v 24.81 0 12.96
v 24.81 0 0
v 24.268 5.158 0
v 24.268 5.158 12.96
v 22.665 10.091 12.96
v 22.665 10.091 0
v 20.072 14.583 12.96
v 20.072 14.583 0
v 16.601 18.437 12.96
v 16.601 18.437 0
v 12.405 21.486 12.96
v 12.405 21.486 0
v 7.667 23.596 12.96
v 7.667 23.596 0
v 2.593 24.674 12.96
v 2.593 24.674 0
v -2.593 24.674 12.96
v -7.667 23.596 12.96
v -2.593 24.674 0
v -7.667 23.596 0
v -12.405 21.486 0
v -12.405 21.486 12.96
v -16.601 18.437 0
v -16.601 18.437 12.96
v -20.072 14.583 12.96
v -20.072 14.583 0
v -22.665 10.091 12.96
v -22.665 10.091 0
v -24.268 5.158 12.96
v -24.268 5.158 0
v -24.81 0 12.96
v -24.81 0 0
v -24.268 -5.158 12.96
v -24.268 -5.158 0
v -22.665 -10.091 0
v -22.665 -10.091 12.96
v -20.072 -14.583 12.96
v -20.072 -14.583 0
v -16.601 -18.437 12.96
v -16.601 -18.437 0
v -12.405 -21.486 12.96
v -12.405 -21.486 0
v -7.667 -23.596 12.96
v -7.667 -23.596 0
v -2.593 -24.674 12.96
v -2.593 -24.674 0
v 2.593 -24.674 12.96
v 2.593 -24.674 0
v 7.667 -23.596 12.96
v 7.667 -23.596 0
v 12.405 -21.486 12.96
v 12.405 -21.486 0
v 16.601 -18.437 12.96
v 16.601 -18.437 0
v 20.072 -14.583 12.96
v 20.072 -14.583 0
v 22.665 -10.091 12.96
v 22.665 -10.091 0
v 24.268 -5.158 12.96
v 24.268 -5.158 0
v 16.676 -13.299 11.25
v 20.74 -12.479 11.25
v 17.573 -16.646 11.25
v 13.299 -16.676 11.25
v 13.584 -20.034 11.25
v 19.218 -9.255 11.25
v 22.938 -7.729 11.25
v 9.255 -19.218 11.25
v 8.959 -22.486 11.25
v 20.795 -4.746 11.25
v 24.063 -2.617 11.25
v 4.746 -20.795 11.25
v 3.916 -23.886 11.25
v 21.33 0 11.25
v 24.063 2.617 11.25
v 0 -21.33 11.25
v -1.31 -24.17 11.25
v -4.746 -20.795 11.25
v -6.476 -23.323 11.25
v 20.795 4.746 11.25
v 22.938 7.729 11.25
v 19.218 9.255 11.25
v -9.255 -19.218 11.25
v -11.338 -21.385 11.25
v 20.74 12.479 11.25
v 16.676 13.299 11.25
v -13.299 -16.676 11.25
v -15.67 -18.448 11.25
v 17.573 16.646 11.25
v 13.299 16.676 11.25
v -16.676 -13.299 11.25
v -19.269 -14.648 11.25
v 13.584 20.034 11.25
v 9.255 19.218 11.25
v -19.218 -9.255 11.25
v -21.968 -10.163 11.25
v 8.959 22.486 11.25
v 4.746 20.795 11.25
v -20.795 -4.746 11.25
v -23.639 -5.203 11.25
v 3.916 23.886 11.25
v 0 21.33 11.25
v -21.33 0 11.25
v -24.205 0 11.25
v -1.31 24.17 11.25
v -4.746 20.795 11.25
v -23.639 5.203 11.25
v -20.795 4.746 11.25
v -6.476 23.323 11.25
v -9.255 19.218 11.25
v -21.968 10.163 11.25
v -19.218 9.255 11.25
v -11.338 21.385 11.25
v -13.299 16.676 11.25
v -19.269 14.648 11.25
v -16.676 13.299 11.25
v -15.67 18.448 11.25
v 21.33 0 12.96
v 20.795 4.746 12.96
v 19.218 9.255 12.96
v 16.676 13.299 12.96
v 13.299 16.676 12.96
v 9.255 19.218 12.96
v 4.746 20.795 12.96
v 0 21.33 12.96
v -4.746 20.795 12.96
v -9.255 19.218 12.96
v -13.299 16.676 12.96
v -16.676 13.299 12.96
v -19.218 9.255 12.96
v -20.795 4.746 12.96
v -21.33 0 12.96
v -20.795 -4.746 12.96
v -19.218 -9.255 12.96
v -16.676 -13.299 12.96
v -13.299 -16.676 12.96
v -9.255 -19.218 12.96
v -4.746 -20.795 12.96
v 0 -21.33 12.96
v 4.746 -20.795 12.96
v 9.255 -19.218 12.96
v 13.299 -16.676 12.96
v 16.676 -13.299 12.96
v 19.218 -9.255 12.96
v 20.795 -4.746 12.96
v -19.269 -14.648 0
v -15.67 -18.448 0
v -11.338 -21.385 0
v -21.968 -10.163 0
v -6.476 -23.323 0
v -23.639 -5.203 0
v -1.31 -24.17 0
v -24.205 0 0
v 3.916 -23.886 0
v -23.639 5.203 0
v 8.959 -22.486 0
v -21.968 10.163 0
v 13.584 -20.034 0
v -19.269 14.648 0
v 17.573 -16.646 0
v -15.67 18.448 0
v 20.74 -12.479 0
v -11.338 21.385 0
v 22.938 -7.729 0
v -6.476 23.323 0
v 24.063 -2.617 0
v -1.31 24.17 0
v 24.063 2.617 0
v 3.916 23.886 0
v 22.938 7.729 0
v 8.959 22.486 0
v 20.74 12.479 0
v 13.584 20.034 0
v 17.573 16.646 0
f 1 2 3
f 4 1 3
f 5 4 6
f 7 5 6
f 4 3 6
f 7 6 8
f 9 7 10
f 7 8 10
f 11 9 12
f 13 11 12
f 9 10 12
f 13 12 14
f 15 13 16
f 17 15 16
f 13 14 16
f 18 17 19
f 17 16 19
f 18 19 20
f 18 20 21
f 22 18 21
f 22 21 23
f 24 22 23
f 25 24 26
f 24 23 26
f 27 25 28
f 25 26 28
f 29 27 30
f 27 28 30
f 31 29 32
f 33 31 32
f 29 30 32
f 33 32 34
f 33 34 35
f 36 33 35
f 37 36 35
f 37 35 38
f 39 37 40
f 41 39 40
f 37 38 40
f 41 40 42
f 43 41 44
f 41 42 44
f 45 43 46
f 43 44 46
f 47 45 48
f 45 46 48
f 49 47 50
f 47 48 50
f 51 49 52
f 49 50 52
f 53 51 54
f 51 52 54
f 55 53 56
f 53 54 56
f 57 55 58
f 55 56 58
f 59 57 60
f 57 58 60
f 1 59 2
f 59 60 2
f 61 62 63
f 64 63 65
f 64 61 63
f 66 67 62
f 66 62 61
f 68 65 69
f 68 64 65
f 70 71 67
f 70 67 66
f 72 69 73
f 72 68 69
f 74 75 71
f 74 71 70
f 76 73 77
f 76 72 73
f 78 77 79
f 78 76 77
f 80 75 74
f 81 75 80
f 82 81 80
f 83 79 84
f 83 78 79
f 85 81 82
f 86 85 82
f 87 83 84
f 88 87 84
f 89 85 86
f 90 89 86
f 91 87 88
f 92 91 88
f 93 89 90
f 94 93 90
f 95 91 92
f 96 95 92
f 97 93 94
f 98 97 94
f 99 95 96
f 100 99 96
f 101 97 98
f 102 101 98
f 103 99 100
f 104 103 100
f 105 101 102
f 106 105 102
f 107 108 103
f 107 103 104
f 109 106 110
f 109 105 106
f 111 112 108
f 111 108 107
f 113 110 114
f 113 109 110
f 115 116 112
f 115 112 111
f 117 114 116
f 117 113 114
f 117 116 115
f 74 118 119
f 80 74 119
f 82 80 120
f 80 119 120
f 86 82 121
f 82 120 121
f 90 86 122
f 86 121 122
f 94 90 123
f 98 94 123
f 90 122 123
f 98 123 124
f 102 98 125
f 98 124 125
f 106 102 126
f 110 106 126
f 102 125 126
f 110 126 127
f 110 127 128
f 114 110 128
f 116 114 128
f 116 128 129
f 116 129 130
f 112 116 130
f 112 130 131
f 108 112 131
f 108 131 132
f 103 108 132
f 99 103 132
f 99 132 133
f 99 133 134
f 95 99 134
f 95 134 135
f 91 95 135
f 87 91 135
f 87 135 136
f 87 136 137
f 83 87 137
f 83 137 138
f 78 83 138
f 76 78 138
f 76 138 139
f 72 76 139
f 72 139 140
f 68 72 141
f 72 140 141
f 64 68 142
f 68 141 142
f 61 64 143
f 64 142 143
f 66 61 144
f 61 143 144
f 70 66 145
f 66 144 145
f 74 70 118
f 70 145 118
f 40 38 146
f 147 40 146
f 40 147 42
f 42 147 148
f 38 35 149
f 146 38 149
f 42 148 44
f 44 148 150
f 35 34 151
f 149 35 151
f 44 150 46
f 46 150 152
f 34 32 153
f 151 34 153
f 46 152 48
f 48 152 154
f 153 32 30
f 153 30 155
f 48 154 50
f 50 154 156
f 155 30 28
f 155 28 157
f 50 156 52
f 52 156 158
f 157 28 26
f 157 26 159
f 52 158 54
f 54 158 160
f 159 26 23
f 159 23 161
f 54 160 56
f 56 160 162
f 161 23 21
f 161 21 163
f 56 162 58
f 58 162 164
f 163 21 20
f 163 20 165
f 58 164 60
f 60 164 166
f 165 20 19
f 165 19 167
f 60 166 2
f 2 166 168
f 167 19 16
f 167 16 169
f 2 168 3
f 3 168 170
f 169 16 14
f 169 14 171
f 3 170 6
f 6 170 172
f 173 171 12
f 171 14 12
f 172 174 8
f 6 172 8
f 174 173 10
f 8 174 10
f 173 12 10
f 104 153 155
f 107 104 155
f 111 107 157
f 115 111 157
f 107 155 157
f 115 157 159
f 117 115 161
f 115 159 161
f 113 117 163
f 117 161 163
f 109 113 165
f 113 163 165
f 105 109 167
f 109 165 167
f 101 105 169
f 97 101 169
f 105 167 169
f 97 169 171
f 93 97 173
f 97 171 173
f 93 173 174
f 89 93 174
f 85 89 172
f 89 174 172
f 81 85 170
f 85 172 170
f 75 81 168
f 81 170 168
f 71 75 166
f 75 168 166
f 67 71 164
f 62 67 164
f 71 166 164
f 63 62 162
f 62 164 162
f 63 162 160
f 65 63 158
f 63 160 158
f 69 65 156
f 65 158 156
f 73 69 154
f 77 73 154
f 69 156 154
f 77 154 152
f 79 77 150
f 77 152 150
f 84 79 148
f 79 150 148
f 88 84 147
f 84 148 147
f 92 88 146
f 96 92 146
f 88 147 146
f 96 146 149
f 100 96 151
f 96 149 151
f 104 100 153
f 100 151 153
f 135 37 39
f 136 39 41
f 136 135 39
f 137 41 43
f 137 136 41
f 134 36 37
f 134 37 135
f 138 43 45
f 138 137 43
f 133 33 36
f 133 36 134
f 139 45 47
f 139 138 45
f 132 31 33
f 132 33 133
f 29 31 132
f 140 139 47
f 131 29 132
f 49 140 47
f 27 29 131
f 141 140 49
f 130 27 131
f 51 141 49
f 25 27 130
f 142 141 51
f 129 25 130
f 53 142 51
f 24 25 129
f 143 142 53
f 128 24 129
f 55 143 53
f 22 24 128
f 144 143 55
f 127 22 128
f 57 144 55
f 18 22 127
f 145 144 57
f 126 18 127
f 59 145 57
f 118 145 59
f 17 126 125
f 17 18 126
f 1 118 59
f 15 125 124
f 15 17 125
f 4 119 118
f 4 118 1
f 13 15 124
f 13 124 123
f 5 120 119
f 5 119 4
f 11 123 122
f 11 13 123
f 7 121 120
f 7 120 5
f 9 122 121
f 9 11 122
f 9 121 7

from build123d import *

# Parameters (mm, degrees)
SKETCH1_R           = 24.81
BOSS_EXTRUDE1_DEPTH = 12.96
SKETCH3_R           = 24.205
CUT_EXTRUDE2_DEPTH  = 11.25
SKETCH4_R           = 21.33
CUT_EXTRUDE3_DEPTH  = 11.25


with BuildPart() as part:
    # Sketch1 → Boss-Extrude1 (new body)
    with BuildSketch(Plane.XY):
        Circle(SKETCH1_R)
    extrude(amount=BOSS_EXTRUDE1_DEPTH)

    # Sketch3 → Cut-Extrude2 (cut)
    with BuildSketch(Plane(origin=(0, 0, 0), x_dir=(-1, 0, 0), z_dir=(0, 0, -1))):
        Circle(SKETCH3_R)
    extrude(amount=-CUT_EXTRUDE2_DEPTH, mode=Mode.SUBTRACT)

    # Sketch4 → Cut-Extrude3 (cut)
    with BuildSketch(Plane.XY.offset(12.96)):
        Circle(SKETCH4_R)
    extrude(amount=-CUT_EXTRUDE3_DEPTH, mode=Mode.SUBTRACT)


solid = part.part
